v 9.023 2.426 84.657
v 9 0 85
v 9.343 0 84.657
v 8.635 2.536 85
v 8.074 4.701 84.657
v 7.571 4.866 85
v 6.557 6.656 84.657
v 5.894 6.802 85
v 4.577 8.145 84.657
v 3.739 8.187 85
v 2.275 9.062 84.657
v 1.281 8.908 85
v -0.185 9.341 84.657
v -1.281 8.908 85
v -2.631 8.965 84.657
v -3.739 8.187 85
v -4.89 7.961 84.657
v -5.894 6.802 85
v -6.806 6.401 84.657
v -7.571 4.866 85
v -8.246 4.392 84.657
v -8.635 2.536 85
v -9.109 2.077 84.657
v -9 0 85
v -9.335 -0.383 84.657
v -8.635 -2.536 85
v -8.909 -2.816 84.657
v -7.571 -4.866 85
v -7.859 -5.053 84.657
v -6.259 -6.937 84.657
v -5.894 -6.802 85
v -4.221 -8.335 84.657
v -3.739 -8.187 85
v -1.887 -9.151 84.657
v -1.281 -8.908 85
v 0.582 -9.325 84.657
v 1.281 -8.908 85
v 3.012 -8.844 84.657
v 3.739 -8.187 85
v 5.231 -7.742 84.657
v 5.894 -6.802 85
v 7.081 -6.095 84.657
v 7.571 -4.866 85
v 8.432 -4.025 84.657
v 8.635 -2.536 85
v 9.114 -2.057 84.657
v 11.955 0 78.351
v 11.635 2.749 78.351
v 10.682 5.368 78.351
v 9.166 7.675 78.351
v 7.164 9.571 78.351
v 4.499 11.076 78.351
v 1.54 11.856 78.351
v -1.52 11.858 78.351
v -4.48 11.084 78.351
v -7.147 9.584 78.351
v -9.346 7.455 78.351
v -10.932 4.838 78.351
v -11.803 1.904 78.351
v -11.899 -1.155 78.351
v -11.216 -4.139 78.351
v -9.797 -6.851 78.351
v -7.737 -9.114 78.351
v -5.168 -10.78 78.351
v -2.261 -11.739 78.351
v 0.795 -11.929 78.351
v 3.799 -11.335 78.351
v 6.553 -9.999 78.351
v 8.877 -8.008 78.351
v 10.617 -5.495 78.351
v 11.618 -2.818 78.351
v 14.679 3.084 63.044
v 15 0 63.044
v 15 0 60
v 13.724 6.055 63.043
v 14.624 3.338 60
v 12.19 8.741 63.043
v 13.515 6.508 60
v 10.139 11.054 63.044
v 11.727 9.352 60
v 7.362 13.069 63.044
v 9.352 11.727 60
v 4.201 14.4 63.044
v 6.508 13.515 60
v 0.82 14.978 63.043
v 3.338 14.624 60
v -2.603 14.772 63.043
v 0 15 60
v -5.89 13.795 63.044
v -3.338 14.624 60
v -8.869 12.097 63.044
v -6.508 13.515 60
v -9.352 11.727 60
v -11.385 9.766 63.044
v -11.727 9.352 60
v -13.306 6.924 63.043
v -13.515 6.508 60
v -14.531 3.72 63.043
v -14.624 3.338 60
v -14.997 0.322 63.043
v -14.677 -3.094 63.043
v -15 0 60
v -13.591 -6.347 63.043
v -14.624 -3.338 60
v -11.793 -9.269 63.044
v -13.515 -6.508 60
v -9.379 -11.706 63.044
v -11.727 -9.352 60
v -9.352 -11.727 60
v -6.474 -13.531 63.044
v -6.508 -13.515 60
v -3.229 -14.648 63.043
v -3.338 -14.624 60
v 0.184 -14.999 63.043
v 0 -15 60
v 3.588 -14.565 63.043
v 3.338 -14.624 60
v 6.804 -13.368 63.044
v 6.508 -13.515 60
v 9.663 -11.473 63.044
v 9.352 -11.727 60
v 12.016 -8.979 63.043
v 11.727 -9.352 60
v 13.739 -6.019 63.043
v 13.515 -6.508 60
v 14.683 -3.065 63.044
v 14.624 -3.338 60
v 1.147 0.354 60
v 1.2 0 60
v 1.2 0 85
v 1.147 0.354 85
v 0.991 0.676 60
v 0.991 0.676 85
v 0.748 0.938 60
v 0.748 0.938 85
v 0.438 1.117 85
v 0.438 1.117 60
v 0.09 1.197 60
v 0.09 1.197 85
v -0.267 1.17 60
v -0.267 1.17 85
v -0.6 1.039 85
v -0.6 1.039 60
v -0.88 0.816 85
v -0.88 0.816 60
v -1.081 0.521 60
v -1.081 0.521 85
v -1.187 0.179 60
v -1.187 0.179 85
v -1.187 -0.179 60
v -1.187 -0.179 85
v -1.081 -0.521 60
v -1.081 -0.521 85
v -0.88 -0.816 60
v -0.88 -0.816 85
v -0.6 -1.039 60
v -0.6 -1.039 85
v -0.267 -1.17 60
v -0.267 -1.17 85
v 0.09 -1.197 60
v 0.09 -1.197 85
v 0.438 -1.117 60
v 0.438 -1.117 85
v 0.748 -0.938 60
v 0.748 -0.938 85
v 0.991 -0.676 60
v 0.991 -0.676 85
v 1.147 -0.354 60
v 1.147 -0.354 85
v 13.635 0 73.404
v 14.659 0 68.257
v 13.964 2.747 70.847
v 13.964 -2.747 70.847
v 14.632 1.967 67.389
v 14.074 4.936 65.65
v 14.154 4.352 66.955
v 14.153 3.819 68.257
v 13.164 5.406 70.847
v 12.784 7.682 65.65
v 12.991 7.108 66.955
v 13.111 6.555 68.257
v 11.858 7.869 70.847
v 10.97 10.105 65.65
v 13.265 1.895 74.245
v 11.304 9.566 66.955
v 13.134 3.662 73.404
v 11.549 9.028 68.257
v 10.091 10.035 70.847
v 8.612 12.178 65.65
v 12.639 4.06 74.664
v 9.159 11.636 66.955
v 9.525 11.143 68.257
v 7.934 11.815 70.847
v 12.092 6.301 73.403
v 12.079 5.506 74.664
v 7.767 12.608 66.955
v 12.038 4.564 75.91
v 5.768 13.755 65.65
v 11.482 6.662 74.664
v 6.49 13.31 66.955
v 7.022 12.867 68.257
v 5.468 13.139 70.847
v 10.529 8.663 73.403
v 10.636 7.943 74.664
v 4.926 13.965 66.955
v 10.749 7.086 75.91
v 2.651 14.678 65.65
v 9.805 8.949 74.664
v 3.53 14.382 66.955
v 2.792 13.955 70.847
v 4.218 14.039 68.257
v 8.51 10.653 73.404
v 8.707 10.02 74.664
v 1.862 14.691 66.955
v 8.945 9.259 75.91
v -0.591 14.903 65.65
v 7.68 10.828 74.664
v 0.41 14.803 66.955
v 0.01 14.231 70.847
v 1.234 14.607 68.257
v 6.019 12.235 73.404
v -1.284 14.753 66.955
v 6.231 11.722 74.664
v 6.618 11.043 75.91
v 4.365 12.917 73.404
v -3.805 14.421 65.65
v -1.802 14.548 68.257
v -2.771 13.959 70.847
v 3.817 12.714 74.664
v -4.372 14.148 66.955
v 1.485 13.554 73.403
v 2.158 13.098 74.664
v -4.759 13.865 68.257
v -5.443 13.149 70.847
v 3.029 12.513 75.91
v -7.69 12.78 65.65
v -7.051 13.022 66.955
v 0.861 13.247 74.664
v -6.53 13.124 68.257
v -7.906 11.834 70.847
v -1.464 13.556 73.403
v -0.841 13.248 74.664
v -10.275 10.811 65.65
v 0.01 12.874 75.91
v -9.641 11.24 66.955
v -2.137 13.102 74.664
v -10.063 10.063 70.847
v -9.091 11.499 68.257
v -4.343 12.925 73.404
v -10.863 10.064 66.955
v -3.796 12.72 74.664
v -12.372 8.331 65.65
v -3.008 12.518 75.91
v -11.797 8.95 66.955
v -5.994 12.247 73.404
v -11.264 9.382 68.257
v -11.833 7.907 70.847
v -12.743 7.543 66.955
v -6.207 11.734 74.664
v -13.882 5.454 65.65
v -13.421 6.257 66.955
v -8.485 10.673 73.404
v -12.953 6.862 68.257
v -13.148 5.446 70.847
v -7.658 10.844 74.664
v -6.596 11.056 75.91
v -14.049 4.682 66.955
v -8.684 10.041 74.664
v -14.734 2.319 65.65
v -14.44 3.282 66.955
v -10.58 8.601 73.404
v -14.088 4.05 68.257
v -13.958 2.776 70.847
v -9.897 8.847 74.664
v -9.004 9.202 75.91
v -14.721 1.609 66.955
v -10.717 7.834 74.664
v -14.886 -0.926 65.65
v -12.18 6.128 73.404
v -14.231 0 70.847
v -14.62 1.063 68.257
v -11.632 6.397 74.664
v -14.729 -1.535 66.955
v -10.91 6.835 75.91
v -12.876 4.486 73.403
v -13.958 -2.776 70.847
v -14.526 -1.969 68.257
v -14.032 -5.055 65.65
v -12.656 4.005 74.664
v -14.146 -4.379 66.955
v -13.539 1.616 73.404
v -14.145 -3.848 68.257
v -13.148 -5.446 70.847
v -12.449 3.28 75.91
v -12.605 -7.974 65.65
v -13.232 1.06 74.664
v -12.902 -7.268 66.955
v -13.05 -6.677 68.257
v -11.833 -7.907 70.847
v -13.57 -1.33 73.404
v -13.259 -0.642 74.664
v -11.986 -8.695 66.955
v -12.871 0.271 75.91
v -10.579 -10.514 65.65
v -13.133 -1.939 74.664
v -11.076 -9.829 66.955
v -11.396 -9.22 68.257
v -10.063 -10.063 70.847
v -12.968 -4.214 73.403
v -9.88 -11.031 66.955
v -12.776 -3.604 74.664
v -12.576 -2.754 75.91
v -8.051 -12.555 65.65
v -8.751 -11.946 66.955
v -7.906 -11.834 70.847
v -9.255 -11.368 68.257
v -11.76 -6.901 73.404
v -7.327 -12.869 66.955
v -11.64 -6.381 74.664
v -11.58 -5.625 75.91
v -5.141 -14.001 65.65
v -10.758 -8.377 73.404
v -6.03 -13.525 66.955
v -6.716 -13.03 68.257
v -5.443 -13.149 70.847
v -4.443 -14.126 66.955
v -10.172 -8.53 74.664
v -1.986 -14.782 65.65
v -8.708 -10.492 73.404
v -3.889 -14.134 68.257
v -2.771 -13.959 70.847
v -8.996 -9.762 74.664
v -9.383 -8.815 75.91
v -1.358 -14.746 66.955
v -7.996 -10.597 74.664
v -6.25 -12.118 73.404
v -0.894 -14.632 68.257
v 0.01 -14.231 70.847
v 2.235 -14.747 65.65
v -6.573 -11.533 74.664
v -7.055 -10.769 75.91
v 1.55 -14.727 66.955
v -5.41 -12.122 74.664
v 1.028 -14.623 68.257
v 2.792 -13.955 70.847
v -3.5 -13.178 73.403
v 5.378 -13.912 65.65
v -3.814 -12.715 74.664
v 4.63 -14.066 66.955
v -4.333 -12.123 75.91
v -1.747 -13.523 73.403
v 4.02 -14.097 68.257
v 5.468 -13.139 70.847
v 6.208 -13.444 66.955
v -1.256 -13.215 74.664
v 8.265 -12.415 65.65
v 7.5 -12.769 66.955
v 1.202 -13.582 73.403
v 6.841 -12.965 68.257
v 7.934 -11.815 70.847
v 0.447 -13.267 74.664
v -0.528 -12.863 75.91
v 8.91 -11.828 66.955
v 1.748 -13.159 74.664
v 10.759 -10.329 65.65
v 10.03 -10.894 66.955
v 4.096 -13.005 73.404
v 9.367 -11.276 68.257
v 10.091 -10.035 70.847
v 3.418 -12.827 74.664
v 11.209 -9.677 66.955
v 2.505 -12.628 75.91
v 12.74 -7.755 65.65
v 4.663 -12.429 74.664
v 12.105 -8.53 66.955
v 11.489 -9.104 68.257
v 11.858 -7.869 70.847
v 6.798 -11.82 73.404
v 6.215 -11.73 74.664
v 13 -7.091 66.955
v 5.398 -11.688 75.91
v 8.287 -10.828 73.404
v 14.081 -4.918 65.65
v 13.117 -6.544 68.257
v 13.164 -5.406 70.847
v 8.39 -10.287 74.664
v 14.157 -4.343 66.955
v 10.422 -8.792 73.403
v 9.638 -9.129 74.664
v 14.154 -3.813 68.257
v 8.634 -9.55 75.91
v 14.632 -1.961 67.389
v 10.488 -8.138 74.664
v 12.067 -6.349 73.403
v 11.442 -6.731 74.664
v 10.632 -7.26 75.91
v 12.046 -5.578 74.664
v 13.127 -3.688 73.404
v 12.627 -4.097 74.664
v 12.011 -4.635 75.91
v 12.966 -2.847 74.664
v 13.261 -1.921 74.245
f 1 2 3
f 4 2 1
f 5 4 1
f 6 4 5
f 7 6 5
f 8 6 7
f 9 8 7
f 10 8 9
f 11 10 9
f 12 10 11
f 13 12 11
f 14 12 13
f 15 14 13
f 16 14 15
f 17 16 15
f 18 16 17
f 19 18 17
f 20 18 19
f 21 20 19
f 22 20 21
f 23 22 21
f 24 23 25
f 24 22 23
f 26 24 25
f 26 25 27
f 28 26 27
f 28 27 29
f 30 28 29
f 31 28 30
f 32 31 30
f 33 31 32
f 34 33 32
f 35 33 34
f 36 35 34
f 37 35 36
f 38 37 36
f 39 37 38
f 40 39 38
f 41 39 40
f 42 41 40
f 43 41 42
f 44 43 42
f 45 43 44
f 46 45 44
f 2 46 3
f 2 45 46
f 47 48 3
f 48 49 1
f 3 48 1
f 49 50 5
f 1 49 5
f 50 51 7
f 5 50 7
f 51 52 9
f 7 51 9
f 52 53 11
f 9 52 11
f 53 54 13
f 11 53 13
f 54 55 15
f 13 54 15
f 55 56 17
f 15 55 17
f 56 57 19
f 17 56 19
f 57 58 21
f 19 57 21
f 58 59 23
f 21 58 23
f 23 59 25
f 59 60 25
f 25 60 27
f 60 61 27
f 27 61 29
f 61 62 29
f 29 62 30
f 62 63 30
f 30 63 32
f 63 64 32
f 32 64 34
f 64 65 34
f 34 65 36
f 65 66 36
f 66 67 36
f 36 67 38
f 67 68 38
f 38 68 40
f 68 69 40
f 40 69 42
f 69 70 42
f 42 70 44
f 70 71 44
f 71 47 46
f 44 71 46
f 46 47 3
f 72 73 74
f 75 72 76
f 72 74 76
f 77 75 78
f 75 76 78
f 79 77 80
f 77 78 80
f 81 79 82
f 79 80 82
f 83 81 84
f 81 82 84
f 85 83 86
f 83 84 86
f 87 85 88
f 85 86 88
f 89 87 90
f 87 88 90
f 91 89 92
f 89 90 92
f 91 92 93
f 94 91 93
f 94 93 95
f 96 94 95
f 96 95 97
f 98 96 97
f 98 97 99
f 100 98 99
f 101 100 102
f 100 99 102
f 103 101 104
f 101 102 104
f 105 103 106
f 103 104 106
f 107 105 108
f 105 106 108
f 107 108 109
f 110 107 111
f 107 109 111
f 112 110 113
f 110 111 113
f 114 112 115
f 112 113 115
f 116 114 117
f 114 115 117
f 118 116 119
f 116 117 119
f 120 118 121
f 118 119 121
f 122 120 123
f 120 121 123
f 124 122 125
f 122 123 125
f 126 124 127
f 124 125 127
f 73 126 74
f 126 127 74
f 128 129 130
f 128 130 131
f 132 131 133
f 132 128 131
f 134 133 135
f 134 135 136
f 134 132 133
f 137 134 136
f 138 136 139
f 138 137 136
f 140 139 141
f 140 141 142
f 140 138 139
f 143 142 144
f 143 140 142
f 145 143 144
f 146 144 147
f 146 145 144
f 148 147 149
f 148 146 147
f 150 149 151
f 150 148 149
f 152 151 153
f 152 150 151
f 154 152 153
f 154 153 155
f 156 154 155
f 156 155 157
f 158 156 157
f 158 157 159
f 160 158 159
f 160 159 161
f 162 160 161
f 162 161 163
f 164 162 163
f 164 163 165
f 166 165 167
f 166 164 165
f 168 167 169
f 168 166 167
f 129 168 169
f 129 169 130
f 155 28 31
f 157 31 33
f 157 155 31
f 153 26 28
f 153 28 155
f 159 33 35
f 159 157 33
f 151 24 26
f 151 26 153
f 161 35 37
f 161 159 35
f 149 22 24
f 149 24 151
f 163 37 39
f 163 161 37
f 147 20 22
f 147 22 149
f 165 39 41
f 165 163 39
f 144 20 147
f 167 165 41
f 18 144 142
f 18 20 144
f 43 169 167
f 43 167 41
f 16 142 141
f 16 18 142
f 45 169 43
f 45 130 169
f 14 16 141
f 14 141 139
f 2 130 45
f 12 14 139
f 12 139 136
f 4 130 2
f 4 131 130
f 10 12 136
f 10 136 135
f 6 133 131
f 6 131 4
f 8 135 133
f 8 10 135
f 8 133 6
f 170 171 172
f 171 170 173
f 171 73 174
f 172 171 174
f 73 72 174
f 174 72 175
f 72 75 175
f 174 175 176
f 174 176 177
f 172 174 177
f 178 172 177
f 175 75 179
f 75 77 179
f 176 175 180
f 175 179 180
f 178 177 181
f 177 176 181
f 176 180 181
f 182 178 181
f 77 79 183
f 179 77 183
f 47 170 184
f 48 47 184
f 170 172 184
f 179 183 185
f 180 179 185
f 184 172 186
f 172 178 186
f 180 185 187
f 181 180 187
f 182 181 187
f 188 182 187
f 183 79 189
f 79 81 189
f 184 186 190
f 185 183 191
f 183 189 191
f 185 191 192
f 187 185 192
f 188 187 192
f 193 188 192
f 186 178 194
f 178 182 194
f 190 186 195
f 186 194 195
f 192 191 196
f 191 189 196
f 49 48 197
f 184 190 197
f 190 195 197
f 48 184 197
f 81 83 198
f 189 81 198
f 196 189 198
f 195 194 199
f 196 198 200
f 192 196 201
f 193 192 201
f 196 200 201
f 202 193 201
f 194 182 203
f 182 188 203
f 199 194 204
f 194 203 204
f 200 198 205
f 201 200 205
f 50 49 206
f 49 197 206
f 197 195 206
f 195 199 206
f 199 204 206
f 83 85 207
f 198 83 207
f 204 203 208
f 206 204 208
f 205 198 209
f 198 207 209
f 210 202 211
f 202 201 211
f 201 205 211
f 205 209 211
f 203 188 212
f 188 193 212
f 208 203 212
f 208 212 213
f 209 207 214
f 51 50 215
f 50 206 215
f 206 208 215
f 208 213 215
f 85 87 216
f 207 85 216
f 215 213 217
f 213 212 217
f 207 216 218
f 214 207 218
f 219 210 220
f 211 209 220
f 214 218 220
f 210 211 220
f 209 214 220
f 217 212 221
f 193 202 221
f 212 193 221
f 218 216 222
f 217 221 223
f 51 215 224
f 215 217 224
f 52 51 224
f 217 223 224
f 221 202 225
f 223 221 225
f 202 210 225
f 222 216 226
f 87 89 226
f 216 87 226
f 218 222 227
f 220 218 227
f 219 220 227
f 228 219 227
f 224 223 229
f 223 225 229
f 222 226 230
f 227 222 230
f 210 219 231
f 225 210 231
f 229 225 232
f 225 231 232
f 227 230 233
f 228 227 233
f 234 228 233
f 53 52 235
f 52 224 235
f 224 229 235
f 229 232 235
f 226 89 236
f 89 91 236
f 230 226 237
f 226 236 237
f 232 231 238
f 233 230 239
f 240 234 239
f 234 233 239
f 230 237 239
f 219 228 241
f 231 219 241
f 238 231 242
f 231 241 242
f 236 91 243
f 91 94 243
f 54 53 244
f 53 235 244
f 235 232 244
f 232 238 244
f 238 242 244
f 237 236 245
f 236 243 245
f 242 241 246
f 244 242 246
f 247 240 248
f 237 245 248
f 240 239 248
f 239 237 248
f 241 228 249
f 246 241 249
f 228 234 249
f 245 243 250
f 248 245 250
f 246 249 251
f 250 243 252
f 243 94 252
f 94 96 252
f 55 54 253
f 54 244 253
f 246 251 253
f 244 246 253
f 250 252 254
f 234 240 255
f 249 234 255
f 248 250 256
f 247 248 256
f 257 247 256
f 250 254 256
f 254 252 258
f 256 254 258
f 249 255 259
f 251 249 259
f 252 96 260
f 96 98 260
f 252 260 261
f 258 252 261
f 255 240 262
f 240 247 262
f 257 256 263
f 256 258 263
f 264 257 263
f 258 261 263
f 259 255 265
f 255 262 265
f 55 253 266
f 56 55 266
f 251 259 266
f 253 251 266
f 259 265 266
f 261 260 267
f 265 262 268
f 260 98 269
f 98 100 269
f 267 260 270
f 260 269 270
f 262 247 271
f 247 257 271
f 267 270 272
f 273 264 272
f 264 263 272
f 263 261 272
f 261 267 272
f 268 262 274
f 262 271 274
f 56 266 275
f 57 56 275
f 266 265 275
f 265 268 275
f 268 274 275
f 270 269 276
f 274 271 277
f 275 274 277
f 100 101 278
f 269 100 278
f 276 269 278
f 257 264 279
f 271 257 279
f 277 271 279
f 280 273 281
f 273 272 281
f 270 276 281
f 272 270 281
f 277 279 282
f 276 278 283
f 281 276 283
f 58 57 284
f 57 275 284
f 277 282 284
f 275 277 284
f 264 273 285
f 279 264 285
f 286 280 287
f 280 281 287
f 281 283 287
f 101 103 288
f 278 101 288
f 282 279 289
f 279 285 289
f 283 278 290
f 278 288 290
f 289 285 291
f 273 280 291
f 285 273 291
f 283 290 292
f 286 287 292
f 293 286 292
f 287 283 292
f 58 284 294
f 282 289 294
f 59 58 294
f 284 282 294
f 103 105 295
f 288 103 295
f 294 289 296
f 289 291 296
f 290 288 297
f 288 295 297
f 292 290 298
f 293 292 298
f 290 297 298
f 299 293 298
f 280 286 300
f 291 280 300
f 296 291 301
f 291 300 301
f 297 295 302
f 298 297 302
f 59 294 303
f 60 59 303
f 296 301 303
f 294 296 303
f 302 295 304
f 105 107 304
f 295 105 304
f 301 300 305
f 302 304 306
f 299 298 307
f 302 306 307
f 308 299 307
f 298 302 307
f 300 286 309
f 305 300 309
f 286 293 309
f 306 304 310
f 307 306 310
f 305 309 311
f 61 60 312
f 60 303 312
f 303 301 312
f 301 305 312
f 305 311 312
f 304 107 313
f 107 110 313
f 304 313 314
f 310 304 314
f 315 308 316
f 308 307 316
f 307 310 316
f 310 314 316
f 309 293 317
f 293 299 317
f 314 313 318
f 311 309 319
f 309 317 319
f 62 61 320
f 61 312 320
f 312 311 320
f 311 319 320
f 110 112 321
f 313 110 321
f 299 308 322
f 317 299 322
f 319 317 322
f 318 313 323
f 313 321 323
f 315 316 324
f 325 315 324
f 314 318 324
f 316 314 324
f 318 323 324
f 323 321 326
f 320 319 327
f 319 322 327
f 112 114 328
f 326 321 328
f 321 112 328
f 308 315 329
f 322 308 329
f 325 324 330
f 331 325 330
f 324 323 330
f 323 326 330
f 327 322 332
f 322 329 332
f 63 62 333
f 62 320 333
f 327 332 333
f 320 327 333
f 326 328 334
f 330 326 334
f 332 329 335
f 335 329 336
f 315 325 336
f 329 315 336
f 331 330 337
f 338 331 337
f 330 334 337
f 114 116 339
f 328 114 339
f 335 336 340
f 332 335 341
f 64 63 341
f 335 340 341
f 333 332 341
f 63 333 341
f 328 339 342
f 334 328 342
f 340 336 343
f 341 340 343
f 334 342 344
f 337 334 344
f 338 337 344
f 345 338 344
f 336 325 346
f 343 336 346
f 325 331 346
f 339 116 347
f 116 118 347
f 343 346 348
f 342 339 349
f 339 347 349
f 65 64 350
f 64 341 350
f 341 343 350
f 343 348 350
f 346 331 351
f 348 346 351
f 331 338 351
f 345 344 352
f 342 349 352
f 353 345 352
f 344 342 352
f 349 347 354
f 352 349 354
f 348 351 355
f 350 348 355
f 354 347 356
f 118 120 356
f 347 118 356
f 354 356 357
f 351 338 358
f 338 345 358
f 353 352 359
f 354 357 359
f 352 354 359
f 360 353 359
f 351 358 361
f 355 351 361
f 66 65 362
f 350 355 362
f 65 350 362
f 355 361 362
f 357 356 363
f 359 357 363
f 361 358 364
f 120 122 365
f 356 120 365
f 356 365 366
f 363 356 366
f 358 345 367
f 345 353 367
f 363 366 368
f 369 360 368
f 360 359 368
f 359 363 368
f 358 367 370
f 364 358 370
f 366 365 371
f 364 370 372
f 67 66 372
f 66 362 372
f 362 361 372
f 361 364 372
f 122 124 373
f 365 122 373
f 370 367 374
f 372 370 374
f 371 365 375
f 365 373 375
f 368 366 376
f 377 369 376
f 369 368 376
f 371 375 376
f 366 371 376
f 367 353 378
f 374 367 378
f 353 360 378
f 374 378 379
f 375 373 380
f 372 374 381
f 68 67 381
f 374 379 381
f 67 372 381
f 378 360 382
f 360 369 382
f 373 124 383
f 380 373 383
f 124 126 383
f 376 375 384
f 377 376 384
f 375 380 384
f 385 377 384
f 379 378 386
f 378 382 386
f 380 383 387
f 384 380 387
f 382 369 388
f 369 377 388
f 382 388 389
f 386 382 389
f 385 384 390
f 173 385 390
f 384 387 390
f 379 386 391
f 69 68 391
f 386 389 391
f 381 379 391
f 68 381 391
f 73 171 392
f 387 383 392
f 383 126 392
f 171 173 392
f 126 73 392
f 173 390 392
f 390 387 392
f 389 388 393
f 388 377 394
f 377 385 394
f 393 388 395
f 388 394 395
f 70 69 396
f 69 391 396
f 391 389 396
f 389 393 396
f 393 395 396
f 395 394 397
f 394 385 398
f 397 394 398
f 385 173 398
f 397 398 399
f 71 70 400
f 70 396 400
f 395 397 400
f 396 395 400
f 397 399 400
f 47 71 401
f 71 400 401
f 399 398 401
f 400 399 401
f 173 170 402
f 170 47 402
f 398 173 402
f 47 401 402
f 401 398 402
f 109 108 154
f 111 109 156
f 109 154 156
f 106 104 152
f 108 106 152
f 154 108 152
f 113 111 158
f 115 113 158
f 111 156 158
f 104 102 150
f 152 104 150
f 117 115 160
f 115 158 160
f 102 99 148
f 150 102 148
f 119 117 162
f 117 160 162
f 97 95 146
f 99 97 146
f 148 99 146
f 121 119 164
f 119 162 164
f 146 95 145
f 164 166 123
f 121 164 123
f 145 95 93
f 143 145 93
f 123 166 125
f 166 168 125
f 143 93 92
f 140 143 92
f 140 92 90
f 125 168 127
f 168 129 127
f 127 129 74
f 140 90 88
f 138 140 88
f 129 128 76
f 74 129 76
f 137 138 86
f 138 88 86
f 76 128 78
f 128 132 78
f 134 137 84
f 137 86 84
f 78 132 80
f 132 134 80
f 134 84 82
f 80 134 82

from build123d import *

# Parameters (mm, degrees)
TUBE_R          = 15
TUBE_R_2        = 1.2
TUBE_DEPTH      = 25
CHAMFER_SIZE    = 6
CHAMFER001_SIZE = 8
FILLET_R        = 40


with BuildPart() as part:
    # Tube → Tube (new body)
    with BuildSketch(Plane.XY):
        Circle(TUBE_R)
        Circle(TUBE_R_2, mode=Mode.SUBTRACT)
    extrude(amount=TUBE_DEPTH)

    # Chamfer
    chamfer_edges = [part.edges().sort_by_distance(p)[0] for p in [
        (-15, 0, 25),
    ]]
    chamfer(chamfer_edges, length=CHAMFER_SIZE)

    # Chamfer001
    chamfer001_edges = [part.edges().sort_by_distance(p)[0] for p in [
        (-15, 0, 19),
    ]]
    chamfer(chamfer001_edges, length=CHAMFER001_SIZE)

    # Fillet
    fillet_edges = [part.edges().sort_by_distance(p)[0] for p in [
        (-14.999996, 0, 11),
    ]]
    fillet(fillet_edges, radius=FILLET_R)


with BuildPart() as part_1:
    # Fillet placement: moved
    add(part.part.moved(Location((0, 0, 60))))


solid = part_1.part
